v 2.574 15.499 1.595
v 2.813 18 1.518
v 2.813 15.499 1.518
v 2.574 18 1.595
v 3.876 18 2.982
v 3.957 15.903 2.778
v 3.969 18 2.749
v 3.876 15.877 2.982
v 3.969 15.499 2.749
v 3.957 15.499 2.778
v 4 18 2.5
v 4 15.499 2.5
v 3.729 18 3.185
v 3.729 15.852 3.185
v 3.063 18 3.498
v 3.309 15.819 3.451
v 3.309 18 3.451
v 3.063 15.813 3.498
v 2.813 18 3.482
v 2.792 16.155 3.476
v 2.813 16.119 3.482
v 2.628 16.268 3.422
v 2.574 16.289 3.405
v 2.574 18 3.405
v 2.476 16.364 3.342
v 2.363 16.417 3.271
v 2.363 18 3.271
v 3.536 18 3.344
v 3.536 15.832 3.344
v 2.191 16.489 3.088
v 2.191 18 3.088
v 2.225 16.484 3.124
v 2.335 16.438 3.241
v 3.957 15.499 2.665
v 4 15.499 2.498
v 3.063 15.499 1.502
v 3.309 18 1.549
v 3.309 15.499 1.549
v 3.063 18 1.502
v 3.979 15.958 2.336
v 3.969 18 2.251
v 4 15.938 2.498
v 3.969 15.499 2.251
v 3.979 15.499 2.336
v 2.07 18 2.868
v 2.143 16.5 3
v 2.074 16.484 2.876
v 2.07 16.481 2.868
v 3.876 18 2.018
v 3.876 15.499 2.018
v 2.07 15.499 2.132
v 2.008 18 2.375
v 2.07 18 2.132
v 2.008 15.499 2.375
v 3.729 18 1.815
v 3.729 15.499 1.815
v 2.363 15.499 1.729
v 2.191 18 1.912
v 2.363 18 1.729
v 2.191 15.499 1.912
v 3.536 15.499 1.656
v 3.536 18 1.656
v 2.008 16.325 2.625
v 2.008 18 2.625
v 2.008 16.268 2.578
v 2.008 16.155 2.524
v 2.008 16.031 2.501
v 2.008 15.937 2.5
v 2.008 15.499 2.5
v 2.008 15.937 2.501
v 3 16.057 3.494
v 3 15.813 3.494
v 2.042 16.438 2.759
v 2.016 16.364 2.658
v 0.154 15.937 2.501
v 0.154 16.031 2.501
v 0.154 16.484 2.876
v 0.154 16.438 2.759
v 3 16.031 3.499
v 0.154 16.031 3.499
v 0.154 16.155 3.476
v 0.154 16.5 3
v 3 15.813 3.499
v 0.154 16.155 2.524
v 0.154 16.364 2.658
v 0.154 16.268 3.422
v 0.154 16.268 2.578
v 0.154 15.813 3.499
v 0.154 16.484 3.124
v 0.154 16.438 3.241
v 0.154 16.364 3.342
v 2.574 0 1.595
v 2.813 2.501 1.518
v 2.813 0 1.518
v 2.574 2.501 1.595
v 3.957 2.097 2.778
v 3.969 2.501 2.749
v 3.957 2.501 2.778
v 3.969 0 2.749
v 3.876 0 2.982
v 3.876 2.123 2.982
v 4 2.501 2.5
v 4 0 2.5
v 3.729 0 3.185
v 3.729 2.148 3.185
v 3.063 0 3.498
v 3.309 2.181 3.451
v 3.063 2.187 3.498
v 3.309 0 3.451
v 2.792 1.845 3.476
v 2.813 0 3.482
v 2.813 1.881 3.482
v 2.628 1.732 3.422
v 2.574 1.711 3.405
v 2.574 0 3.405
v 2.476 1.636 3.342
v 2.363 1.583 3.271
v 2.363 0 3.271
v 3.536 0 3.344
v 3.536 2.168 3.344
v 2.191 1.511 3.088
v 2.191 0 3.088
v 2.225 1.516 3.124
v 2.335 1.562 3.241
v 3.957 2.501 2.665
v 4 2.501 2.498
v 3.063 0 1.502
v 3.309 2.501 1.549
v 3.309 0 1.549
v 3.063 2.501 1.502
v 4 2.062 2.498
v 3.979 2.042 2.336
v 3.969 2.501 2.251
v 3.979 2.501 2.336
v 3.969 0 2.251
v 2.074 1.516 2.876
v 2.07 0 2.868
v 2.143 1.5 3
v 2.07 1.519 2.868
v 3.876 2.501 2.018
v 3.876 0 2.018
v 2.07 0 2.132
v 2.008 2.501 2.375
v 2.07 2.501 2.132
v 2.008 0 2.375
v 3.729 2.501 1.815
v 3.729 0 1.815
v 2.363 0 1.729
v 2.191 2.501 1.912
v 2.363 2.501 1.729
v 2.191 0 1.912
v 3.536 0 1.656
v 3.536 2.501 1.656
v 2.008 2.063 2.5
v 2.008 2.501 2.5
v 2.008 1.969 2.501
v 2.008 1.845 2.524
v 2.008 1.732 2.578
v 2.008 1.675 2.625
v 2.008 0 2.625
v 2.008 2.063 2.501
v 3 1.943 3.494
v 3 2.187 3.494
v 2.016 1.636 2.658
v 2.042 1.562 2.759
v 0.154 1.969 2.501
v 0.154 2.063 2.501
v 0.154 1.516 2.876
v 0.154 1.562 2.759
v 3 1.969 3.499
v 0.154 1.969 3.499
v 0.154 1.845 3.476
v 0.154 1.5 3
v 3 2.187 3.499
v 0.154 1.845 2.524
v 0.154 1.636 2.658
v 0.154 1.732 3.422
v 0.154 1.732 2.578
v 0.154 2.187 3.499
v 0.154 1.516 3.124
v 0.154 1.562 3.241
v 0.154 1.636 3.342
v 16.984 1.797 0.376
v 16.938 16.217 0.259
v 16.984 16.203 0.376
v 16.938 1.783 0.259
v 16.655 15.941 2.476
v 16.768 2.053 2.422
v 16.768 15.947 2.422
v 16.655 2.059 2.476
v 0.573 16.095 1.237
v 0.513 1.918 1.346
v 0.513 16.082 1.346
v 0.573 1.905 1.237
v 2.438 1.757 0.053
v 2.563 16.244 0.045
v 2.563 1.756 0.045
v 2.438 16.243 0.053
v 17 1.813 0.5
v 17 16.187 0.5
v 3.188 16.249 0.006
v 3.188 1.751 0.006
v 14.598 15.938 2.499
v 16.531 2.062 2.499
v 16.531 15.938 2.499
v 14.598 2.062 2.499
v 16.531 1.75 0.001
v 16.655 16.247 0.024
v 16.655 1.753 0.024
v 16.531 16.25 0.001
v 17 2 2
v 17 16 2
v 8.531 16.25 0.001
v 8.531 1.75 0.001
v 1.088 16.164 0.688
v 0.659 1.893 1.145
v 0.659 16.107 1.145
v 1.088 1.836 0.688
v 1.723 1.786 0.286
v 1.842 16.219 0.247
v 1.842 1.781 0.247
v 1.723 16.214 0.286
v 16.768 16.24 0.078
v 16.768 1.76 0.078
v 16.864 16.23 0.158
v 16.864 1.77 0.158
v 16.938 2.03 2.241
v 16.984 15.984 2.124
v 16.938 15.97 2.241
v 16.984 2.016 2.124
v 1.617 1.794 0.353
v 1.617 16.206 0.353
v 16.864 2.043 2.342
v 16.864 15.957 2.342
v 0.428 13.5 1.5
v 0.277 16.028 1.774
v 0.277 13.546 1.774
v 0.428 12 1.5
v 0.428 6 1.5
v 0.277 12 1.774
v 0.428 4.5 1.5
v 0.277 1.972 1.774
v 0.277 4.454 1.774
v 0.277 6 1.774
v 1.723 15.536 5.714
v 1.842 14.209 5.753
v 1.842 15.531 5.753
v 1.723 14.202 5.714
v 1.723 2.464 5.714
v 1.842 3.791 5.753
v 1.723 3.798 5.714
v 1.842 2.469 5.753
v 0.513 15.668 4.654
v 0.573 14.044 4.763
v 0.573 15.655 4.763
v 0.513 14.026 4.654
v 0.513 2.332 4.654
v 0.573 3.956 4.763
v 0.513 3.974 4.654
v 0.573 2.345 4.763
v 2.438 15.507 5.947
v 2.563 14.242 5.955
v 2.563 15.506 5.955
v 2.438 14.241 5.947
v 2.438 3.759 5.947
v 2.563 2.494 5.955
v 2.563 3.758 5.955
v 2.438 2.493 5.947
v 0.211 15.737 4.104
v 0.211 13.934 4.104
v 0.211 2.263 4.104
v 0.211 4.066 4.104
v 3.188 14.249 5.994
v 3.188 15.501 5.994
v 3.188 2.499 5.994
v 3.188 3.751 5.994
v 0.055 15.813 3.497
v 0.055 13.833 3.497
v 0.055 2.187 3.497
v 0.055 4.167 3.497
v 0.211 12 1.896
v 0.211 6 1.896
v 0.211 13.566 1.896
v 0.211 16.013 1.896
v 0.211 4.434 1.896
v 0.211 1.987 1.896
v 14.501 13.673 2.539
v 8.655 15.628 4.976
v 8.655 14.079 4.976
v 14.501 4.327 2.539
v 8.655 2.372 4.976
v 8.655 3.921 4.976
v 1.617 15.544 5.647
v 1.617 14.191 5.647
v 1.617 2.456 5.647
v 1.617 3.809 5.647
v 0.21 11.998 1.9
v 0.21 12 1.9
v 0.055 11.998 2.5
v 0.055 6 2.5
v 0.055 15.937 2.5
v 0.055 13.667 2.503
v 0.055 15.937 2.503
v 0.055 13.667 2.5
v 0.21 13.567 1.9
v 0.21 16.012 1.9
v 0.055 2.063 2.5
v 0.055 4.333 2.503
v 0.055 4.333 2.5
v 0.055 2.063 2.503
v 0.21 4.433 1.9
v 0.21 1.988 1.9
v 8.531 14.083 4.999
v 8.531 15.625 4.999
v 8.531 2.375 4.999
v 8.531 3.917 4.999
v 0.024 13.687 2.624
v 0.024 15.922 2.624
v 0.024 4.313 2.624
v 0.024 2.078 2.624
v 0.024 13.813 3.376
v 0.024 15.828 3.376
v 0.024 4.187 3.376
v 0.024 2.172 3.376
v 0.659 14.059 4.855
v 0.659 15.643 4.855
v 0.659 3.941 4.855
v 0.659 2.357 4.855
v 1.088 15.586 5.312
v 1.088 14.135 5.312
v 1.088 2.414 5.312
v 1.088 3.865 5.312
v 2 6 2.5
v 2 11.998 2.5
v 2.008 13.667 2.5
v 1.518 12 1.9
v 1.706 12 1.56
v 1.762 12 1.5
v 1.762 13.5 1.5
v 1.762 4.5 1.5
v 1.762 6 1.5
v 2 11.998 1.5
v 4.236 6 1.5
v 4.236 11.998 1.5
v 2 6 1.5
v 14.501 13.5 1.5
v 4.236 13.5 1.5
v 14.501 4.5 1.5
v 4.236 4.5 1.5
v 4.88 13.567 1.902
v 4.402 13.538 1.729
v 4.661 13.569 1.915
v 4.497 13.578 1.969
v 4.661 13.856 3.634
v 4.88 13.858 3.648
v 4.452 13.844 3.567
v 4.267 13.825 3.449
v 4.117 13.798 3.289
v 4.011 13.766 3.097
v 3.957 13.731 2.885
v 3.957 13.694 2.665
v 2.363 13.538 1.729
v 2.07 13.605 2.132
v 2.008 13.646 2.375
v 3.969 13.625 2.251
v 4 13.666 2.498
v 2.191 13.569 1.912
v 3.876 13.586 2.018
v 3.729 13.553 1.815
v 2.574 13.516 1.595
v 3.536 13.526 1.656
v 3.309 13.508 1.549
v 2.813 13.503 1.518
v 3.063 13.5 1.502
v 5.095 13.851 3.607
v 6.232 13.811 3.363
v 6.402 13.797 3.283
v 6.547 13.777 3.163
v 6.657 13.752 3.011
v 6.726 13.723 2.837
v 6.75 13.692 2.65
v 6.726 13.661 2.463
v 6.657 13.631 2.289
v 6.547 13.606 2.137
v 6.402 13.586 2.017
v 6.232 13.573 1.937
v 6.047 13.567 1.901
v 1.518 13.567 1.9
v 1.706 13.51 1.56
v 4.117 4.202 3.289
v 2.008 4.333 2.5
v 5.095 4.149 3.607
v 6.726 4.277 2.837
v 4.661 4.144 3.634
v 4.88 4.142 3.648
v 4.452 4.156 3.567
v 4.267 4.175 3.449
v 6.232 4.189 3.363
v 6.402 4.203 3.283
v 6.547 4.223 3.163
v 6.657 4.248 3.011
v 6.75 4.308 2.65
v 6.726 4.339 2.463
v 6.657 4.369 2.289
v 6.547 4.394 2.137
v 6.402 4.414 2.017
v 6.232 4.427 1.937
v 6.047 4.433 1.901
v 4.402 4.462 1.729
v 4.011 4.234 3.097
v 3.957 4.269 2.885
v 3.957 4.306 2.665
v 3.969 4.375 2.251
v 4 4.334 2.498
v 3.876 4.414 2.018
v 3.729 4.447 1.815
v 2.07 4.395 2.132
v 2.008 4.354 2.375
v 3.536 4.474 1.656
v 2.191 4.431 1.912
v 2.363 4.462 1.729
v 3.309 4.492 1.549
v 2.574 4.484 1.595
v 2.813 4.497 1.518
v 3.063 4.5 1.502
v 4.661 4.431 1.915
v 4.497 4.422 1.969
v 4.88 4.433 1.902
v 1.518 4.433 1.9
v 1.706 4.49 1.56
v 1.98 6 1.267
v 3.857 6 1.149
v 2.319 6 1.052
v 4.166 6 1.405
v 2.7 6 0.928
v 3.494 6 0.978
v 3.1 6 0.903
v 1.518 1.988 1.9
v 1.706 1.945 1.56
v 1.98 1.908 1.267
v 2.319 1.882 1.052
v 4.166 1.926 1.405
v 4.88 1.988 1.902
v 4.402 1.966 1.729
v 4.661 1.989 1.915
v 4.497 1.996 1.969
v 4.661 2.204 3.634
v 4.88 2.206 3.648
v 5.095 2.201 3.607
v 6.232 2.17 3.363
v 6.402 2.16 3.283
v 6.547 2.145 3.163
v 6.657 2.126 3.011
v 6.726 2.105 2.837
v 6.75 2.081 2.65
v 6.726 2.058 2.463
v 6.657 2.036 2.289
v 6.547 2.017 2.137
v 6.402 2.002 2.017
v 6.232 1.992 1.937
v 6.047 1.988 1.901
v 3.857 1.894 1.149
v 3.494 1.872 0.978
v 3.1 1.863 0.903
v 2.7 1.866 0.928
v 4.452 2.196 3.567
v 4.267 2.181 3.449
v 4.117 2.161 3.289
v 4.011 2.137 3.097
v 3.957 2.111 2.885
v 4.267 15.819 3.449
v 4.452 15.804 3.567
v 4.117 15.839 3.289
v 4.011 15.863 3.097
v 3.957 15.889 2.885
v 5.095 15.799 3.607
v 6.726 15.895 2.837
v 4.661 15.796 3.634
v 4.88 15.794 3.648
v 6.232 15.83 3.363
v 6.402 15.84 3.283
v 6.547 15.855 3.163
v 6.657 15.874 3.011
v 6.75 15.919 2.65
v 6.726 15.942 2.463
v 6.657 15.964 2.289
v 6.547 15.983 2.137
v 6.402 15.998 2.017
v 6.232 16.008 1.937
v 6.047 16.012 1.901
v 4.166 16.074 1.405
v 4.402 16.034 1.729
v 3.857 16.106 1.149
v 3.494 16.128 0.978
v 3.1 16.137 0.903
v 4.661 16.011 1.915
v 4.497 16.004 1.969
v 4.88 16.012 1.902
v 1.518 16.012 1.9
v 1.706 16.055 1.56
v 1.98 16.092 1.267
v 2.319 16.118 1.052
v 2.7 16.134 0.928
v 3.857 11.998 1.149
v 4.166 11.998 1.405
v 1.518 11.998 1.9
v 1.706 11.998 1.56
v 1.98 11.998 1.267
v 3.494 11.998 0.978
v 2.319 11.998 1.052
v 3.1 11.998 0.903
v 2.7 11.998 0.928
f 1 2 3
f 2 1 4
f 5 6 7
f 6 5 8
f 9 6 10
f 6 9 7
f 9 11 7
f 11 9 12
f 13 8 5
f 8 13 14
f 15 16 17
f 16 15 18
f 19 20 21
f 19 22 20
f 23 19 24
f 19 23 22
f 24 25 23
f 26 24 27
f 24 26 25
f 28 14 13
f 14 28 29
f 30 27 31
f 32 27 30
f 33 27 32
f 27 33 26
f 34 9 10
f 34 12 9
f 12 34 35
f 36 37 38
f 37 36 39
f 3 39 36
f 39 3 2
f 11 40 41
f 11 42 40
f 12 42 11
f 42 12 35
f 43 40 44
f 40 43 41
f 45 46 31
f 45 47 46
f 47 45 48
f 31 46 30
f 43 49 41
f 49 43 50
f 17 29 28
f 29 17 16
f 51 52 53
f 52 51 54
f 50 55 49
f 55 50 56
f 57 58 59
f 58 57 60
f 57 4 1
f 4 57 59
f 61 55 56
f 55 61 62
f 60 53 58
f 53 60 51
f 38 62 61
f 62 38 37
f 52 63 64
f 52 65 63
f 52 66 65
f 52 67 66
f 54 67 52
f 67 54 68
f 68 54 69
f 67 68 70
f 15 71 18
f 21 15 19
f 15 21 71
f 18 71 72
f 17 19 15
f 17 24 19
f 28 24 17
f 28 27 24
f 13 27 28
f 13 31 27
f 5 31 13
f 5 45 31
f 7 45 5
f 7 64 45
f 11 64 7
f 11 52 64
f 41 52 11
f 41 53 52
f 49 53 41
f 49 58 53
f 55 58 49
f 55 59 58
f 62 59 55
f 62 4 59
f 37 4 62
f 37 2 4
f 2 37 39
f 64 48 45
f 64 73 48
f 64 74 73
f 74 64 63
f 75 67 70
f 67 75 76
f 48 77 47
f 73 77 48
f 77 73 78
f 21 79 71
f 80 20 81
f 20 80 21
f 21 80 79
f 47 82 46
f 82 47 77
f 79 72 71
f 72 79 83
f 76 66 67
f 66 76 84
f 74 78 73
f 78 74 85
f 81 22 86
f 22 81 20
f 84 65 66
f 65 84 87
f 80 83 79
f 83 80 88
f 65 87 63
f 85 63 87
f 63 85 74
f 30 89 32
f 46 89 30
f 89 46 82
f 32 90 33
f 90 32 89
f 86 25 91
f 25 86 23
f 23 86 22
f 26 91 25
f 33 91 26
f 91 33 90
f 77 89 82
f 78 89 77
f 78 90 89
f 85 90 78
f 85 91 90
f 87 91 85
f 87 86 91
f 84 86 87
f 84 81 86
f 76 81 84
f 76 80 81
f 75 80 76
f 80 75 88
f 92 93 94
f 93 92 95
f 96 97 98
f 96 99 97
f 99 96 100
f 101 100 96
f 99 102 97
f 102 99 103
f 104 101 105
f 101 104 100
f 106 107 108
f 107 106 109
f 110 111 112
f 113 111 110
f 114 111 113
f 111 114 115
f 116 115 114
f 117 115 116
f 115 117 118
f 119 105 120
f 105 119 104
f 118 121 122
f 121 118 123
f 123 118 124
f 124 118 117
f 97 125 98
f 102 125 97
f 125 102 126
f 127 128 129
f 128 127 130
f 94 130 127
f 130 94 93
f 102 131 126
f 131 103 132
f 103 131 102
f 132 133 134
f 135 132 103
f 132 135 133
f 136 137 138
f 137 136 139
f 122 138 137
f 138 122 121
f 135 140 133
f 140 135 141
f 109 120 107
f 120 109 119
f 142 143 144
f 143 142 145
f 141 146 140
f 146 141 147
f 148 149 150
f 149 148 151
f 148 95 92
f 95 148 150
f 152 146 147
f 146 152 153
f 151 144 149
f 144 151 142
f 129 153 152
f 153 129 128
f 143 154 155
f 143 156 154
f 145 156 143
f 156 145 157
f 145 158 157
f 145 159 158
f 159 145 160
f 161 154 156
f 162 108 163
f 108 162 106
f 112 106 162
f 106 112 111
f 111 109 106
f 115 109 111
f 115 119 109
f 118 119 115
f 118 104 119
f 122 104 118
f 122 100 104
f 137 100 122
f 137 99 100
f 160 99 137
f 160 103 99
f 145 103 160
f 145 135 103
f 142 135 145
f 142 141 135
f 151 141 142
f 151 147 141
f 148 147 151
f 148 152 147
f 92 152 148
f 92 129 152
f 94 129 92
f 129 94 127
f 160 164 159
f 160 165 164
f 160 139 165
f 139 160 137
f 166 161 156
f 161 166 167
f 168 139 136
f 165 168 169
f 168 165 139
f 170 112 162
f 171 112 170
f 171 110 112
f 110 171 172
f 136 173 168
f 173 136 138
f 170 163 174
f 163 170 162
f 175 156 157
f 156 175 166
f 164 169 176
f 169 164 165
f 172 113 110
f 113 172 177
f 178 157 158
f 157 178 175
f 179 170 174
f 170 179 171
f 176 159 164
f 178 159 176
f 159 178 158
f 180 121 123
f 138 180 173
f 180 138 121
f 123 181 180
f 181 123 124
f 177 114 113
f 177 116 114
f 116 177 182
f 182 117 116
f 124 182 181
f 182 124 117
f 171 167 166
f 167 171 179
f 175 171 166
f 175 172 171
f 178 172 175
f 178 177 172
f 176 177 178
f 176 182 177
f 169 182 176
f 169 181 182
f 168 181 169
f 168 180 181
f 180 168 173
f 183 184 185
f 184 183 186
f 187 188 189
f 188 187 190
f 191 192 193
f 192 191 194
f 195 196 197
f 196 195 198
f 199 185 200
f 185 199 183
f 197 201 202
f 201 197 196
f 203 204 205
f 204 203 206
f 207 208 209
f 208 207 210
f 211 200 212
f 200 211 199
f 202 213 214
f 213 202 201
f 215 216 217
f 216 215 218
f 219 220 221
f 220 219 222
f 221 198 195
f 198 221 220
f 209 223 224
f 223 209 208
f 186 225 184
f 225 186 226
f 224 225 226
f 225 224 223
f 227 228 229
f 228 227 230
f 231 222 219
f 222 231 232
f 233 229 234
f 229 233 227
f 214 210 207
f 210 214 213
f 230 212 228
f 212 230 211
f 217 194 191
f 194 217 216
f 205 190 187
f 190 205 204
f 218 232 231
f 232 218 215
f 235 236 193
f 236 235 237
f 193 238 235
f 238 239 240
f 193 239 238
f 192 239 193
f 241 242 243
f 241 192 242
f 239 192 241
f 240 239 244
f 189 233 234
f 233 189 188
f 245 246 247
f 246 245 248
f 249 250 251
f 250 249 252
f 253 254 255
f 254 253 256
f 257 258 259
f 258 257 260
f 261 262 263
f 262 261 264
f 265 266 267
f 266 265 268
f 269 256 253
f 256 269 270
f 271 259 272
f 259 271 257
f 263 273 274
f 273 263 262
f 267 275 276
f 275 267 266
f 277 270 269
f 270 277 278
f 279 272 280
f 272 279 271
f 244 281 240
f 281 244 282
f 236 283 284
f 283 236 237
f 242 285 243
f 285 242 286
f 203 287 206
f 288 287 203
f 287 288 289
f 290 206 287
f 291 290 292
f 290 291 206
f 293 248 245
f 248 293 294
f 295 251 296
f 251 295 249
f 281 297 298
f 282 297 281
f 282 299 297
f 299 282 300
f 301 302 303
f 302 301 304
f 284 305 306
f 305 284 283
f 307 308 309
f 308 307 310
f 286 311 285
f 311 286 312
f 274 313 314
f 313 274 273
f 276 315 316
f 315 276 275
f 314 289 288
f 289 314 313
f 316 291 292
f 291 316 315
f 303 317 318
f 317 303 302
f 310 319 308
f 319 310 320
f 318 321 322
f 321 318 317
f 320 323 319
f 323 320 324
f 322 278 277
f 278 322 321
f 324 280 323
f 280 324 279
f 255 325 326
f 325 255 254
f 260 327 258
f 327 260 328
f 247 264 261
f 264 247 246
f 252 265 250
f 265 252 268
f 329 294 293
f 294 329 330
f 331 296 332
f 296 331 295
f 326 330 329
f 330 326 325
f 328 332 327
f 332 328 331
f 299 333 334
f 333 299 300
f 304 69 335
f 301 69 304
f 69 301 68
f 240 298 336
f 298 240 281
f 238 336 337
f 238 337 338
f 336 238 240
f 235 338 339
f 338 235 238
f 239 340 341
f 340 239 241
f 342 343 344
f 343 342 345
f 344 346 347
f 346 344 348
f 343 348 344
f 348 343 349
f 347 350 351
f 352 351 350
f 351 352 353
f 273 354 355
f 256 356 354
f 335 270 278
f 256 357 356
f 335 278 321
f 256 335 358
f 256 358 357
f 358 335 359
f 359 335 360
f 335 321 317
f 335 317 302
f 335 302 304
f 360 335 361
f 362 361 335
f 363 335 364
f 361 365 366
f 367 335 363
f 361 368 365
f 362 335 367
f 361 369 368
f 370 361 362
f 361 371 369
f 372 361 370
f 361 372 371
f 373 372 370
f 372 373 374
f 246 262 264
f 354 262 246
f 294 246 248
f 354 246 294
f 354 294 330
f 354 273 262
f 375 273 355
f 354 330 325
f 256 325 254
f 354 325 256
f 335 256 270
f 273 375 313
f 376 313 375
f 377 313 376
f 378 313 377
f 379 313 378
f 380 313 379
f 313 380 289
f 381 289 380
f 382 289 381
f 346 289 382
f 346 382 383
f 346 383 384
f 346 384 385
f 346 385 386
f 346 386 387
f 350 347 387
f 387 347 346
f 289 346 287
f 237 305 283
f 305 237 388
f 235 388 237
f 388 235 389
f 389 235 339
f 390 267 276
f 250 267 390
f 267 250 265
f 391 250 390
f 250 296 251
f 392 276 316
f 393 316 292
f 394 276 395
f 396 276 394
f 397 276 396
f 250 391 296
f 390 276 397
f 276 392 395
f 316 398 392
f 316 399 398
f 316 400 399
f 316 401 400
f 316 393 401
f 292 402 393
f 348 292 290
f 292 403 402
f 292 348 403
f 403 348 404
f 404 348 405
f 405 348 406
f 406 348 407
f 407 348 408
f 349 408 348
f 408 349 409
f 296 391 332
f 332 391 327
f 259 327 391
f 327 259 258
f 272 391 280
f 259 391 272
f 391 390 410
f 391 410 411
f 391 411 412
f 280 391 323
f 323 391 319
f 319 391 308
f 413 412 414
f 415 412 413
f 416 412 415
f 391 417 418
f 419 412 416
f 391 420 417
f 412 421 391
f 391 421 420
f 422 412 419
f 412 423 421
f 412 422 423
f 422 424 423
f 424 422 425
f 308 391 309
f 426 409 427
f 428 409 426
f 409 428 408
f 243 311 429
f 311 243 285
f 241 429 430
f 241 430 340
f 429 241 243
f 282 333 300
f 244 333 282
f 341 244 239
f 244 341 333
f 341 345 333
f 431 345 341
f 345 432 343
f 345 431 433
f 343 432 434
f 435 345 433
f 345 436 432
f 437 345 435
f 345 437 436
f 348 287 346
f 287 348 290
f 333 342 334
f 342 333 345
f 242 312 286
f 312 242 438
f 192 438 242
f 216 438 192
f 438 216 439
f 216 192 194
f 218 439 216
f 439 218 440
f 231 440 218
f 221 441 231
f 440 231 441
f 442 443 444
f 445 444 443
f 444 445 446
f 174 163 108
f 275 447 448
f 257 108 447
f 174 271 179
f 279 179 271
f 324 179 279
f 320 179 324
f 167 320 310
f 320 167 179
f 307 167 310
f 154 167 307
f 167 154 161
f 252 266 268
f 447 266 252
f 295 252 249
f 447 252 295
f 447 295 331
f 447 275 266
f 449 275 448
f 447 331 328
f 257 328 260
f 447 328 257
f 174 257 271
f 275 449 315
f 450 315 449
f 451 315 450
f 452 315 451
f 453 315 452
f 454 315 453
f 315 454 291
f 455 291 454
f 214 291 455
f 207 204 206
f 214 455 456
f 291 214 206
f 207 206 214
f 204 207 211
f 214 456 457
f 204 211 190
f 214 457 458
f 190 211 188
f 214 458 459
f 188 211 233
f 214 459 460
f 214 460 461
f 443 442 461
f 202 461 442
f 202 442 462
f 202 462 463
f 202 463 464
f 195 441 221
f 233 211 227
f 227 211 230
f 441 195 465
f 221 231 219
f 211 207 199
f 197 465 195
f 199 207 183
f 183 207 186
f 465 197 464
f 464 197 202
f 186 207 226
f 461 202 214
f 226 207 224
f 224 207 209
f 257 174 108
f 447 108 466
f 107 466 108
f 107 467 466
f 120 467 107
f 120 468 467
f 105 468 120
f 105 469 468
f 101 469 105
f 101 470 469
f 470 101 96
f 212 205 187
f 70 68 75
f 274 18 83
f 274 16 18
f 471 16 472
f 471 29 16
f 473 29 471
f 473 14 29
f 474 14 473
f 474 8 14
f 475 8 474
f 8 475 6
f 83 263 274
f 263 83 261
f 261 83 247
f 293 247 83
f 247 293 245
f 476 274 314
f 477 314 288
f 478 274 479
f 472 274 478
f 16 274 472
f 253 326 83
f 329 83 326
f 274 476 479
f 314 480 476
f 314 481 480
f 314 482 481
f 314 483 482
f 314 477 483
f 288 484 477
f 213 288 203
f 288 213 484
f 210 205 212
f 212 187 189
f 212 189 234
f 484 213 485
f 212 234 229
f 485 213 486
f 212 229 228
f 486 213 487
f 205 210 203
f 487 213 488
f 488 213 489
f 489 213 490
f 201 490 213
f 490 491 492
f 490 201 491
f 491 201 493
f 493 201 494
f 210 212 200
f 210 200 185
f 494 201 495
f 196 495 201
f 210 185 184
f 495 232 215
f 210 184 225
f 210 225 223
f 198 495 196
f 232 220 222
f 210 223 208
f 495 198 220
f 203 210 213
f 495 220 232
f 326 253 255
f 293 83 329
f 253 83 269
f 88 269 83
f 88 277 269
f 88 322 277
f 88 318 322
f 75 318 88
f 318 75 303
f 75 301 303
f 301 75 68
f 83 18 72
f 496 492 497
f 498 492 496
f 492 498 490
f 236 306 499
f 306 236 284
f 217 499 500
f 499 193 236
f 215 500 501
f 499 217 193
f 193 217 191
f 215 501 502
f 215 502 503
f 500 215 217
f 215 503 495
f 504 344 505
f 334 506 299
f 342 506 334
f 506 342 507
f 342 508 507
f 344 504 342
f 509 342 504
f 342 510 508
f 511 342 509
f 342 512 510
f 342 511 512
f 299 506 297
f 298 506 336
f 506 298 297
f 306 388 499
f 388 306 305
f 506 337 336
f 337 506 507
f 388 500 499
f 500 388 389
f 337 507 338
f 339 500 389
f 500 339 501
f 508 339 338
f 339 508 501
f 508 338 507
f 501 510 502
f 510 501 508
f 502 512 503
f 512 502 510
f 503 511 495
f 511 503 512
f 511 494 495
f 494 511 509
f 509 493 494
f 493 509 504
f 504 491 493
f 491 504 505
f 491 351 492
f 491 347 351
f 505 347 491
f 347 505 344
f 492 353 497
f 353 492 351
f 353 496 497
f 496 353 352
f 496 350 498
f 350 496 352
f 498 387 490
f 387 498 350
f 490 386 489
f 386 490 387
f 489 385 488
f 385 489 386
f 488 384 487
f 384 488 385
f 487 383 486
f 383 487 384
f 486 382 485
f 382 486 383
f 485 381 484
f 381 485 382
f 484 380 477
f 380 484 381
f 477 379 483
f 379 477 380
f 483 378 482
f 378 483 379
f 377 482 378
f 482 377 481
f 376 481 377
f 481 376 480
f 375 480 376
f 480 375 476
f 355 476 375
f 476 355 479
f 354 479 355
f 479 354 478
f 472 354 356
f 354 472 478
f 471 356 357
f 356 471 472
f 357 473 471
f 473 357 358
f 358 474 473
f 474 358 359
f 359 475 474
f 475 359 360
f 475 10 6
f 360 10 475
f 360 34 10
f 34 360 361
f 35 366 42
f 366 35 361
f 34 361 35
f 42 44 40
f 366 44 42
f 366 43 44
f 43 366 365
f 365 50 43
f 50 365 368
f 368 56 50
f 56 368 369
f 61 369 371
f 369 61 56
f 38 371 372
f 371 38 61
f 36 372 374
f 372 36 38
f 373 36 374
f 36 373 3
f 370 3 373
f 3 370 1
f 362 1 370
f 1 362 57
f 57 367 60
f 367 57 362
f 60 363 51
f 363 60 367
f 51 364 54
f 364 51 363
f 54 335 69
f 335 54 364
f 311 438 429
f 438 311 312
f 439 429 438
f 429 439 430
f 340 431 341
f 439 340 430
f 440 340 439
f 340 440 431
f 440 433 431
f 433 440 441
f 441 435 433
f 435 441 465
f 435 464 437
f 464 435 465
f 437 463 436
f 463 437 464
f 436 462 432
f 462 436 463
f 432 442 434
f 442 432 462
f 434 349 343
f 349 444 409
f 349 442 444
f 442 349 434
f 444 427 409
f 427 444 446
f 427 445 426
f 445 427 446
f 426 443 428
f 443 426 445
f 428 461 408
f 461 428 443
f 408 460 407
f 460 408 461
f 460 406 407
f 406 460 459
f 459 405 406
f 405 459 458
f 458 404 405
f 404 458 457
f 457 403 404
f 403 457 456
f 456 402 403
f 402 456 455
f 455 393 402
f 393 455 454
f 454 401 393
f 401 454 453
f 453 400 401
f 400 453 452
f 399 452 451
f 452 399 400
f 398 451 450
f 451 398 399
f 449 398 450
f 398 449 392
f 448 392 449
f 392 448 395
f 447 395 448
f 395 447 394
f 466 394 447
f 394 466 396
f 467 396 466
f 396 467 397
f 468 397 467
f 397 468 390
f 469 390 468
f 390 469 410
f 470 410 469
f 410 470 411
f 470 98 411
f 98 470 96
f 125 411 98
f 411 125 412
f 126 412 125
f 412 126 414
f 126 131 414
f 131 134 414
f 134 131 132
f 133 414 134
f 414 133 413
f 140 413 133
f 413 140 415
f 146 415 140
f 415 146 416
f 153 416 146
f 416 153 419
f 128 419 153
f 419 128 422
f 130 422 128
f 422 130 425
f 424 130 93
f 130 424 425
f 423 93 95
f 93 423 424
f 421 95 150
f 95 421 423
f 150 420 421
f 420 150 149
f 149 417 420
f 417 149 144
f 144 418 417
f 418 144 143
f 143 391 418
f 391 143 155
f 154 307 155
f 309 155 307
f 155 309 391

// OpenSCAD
fineness=25;
minkowski_fineness=25;


module peg(){
    
    translate([0,0,-0.001])
    cylinder(2.5+0.001,1,1,$fn=fineness);
    rotate([0,-90,0])
    translate([0.5,0.5,0])
    hull(){
        cylinder(cos(atan(1/3))*3,.5,.5,$fn=fineness);
        translate([-0.5,0,0])
        cylinder(cos(atan(1/3))*3,.5,.5,$fn=fineness);
    }

}

module snap_cutout(){
    
    translate([-3-0.001,2.5-0.6])
    square(size=[2.001,0.6]);

    translate([0,2.5])
    difference(){
        circle(1.6,$fn=fineness);
        circle(1,$fn=fineness);
        translate([-1.6-0.001,0])
        square(size=[3.2+0.002,1.6+0.001]);
    }

    hull(){
        translate([1.75/2+1-0.05,+2.5+1.75/2-0.6])
        circle(1.75/2,$fn=fineness);
        
        translate([3,+2.5+1.75/2-0.6-0.125])
        circle((1.75-0.25)/2,$fn=fineness);
        
        
    }

}

module keyboard_foot(){
        
    translate([0,2.5,0]){
        translate([0,0,0.75])
        mirror([0,0,1])
        peg();

        translate([0,0,14.5-0.75])
        peg();
    }

    difference(){
        
    minkowski(){
    union(){
    hull(){
        translate([0,3,0])
        cylinder(14.5/2,2.5,2.5,$fn=fineness);

        linear_extrude(14.5/2,convexity=10)
        polygon(points=[[5.5,0.5],[13.5,.5],[11.5,2],[5.5,4.5]],polys=[0,1,2,3,4,5]);
        
    }
        linear_extrude(14.5/2,convexity=10)
        polygon(points=[[5.5,0.5],[13.5,.5],[13.5,2],[11.5,2],[5.5,4.5]],polys=[0,1,2,3,4,5]);
    }


    cylinder(14.5/2,0.5,0.5,$fn=minkowski_fineness);
    }

    translate([-3-0.001,1.5,10.5+2])
    rotate([0,90,0])
    linear_extrude(11.5+3+.001,convexity=10)
    polygon(points=[[0.75,0],[2.25,0],[2.25,1],[8.25,1],[8.25,0],[9.75,0],[10.5,4.5],[10.5,5.5],[0,5.5],[0,4.5]]);

    translate([-1,1.5,10.5+2])
    rotate([0,90,0])
    linear_extrude(11.5+1+.001,convexity=10)
    polygon(points=[[0.75,0],[9.75,0],[10.5,4.5],[10.5,5.5],[0,5.5],[0,4.5]]);


    translate([-3-0.001,0,14.5])
    rotate([0,90,0])
    linear_extrude(14+3+0.002,convexity=10)
    polygon(points=[[-0.001,-0.001],[0,-0.001],[0.75,6.001],[-0.001,6.001]]);

    translate([-3-0.001,0,0])
    mirror([0,0,1])
    rotate([0,90,0])
    linear_extrude(14+3+0.002,convexity=10)
    polygon(points=[[-0.001,-0.001],[0,-0.001],[0.75,6.001],[-0.001,6.001]]);



    linear_extrude(1.5+2.75+0.002,convexity=10)
    snap_cutout();

    translate([0,0,14.5-2.75-1.5])
    linear_extrude(1.5+2.75+0.002,convexity=10)
    snap_cutout();

    }
}

translate([3,14.5+3.5/2,0])
rotate([90,0,0])
keyboard_foot();
